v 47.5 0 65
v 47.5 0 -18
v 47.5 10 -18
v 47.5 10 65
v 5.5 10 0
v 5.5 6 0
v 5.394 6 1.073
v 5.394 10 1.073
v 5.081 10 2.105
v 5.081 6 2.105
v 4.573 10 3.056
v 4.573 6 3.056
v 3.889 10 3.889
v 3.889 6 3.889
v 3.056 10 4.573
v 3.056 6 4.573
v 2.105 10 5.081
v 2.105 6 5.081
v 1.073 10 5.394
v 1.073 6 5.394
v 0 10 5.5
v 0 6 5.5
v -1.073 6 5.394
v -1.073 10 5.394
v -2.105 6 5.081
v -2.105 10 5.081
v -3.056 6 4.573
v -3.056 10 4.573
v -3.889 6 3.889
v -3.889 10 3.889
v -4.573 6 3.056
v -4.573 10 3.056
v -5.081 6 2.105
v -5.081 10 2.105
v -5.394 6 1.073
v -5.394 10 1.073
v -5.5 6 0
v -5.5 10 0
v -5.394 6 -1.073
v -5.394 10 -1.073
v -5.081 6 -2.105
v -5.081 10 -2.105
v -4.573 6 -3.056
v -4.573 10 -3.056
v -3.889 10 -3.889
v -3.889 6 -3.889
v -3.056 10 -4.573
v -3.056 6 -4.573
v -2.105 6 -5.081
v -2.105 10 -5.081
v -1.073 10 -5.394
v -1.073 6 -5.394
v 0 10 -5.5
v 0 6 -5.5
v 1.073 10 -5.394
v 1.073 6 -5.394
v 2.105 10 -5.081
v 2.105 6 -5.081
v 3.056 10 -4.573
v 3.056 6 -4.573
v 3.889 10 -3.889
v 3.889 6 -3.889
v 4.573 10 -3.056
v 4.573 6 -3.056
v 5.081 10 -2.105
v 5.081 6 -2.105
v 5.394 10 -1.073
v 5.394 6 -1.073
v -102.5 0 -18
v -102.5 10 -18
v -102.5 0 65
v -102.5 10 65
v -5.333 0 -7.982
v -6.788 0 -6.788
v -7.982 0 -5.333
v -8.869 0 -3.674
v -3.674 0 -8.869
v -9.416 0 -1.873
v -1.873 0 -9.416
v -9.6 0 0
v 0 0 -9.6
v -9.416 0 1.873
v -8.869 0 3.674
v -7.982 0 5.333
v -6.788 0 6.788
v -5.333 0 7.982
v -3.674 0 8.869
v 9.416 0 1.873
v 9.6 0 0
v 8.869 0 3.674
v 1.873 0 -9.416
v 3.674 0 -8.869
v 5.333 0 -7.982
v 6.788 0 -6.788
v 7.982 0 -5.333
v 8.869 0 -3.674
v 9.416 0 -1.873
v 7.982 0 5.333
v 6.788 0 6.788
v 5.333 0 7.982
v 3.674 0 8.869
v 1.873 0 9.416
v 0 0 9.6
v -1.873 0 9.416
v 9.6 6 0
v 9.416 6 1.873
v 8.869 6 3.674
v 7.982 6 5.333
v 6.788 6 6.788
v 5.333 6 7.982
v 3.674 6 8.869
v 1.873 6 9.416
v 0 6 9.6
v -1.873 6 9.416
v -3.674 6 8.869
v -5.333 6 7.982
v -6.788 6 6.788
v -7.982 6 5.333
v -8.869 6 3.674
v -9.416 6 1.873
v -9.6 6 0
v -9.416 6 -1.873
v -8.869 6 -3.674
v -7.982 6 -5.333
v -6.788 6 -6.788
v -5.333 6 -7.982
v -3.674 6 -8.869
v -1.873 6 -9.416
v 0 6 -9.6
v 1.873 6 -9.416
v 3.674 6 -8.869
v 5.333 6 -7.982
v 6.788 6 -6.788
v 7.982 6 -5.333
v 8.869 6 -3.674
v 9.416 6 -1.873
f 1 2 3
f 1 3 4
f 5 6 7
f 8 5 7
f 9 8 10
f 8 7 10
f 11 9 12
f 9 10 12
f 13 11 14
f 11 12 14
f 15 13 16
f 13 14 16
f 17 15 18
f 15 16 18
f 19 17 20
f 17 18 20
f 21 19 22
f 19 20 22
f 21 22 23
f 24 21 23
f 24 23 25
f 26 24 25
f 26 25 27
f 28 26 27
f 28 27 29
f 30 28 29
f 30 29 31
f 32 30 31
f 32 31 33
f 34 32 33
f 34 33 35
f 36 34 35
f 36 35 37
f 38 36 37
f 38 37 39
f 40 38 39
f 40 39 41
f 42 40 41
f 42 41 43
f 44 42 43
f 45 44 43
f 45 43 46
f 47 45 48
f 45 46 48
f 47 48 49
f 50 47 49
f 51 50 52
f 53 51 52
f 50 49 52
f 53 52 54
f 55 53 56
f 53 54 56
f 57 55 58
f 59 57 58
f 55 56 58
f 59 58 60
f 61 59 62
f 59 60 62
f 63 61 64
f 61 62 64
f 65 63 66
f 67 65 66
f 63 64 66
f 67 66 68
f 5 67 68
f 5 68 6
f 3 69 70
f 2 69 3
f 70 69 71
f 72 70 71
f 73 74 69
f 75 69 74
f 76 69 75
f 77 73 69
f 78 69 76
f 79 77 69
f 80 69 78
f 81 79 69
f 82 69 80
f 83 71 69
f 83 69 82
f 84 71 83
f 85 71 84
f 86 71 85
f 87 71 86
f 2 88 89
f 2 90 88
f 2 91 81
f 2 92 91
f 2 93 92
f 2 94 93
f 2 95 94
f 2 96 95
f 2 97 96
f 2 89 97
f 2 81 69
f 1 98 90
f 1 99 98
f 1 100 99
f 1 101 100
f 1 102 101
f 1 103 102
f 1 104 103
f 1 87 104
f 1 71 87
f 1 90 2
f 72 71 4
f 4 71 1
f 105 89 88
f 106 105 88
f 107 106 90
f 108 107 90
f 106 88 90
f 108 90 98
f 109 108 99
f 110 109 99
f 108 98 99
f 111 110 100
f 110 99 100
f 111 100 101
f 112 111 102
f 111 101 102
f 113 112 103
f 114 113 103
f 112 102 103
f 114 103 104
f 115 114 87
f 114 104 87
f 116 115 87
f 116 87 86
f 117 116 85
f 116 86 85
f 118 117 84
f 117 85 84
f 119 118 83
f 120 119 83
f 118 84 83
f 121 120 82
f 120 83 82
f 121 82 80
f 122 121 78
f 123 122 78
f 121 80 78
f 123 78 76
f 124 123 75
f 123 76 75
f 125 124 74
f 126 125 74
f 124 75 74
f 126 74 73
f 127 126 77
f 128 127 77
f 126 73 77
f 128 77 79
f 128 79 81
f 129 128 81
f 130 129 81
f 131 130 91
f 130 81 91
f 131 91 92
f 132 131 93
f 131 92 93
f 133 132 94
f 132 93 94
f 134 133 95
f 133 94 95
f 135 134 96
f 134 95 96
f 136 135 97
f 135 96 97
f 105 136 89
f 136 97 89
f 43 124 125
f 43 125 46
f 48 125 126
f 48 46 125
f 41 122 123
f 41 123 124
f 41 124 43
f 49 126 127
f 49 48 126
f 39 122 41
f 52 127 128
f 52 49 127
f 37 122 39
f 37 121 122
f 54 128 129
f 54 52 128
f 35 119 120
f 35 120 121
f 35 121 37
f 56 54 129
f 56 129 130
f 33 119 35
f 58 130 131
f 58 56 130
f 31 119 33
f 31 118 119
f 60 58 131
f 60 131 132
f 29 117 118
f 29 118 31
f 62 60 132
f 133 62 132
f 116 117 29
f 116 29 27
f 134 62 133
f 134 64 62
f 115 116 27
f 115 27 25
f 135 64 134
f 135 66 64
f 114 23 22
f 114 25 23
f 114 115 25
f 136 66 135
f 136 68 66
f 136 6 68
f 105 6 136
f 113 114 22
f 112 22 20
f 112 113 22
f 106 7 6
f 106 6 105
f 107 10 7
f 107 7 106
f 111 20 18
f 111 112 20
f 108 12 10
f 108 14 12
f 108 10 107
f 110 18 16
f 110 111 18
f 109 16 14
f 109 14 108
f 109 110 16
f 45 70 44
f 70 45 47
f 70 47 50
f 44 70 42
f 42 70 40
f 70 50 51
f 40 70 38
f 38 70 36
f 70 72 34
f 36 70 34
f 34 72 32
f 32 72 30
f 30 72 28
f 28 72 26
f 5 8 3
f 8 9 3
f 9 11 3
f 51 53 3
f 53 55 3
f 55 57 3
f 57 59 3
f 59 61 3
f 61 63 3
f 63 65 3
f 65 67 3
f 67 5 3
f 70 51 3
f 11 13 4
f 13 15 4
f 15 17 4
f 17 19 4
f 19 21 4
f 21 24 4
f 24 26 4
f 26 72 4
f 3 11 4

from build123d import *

# Parameters (mm, degrees)
SKETCH_AS_DRAWN_R                    = 9.6
EXTRUDE_DEPTH                        = 6
EXTRUDE_ONTO_SKETCH_ROLL_ANGLE       = 90
SKETCH001_AS_DRAWN_W                 = 150
SKETCH001_AS_DRAWN_H                 = 83
SKETCH001_AS_DRAWN_R                 = 5.5
EXTRUDE001_DEPTH                     = 10
EXTRUDE001_ONTO_SKETCH001_ROLL_ANGLE = 90


with BuildPart() as pocheroulementw:
    # Sketch as drawn → Extrude (new)
    with BuildSketch(Plane.XY):
        Circle(SKETCH_AS_DRAWN_R)
    extrude(amount=-EXTRUDE_DEPTH)


with BuildPart() as pocheroulementw_1:
    # Extrude onto Sketch roll: moved
    add(pocheroulementw.part.rotate(Axis((0, 0, 0), (1, 0, 0)), EXTRUDE_ONTO_SKETCH_ROLL_ANGLE))


with BuildPart() as pocheroulementw_2:
    # Extrude onto Sketch placement: moved
    add(pocheroulementw_1.part)


with BuildPart() as supportmoteurw:
    # Sketch001 as drawn → Extrude001 (new)
    with BuildSketch(Plane.XY):
        with Locations((-27.5, 23.5)):
            Rectangle(SKETCH001_AS_DRAWN_W, SKETCH001_AS_DRAWN_H)
        Circle(SKETCH001_AS_DRAWN_R, mode=Mode.SUBTRACT)
    extrude(amount=-EXTRUDE001_DEPTH)


with BuildPart() as supportmoteurw_1:
    # Extrude001 onto Sketch001 roll: moved
    add(supportmoteurw.part.rotate(Axis((0, 0, 0), (1, 0, 0)), EXTRUDE001_ONTO_SKETCH001_ROLL_ANGLE))


with BuildPart() as supportmoteurw_2:
    # Extrude001 onto Sketch001 placement: moved
    add(supportmoteurw_1.part)

    # Cut: cut pocheRoulementW
    add(pocheroulementw_2.part, mode=Mode.SUBTRACT)


solid = supportmoteurw_2.part
